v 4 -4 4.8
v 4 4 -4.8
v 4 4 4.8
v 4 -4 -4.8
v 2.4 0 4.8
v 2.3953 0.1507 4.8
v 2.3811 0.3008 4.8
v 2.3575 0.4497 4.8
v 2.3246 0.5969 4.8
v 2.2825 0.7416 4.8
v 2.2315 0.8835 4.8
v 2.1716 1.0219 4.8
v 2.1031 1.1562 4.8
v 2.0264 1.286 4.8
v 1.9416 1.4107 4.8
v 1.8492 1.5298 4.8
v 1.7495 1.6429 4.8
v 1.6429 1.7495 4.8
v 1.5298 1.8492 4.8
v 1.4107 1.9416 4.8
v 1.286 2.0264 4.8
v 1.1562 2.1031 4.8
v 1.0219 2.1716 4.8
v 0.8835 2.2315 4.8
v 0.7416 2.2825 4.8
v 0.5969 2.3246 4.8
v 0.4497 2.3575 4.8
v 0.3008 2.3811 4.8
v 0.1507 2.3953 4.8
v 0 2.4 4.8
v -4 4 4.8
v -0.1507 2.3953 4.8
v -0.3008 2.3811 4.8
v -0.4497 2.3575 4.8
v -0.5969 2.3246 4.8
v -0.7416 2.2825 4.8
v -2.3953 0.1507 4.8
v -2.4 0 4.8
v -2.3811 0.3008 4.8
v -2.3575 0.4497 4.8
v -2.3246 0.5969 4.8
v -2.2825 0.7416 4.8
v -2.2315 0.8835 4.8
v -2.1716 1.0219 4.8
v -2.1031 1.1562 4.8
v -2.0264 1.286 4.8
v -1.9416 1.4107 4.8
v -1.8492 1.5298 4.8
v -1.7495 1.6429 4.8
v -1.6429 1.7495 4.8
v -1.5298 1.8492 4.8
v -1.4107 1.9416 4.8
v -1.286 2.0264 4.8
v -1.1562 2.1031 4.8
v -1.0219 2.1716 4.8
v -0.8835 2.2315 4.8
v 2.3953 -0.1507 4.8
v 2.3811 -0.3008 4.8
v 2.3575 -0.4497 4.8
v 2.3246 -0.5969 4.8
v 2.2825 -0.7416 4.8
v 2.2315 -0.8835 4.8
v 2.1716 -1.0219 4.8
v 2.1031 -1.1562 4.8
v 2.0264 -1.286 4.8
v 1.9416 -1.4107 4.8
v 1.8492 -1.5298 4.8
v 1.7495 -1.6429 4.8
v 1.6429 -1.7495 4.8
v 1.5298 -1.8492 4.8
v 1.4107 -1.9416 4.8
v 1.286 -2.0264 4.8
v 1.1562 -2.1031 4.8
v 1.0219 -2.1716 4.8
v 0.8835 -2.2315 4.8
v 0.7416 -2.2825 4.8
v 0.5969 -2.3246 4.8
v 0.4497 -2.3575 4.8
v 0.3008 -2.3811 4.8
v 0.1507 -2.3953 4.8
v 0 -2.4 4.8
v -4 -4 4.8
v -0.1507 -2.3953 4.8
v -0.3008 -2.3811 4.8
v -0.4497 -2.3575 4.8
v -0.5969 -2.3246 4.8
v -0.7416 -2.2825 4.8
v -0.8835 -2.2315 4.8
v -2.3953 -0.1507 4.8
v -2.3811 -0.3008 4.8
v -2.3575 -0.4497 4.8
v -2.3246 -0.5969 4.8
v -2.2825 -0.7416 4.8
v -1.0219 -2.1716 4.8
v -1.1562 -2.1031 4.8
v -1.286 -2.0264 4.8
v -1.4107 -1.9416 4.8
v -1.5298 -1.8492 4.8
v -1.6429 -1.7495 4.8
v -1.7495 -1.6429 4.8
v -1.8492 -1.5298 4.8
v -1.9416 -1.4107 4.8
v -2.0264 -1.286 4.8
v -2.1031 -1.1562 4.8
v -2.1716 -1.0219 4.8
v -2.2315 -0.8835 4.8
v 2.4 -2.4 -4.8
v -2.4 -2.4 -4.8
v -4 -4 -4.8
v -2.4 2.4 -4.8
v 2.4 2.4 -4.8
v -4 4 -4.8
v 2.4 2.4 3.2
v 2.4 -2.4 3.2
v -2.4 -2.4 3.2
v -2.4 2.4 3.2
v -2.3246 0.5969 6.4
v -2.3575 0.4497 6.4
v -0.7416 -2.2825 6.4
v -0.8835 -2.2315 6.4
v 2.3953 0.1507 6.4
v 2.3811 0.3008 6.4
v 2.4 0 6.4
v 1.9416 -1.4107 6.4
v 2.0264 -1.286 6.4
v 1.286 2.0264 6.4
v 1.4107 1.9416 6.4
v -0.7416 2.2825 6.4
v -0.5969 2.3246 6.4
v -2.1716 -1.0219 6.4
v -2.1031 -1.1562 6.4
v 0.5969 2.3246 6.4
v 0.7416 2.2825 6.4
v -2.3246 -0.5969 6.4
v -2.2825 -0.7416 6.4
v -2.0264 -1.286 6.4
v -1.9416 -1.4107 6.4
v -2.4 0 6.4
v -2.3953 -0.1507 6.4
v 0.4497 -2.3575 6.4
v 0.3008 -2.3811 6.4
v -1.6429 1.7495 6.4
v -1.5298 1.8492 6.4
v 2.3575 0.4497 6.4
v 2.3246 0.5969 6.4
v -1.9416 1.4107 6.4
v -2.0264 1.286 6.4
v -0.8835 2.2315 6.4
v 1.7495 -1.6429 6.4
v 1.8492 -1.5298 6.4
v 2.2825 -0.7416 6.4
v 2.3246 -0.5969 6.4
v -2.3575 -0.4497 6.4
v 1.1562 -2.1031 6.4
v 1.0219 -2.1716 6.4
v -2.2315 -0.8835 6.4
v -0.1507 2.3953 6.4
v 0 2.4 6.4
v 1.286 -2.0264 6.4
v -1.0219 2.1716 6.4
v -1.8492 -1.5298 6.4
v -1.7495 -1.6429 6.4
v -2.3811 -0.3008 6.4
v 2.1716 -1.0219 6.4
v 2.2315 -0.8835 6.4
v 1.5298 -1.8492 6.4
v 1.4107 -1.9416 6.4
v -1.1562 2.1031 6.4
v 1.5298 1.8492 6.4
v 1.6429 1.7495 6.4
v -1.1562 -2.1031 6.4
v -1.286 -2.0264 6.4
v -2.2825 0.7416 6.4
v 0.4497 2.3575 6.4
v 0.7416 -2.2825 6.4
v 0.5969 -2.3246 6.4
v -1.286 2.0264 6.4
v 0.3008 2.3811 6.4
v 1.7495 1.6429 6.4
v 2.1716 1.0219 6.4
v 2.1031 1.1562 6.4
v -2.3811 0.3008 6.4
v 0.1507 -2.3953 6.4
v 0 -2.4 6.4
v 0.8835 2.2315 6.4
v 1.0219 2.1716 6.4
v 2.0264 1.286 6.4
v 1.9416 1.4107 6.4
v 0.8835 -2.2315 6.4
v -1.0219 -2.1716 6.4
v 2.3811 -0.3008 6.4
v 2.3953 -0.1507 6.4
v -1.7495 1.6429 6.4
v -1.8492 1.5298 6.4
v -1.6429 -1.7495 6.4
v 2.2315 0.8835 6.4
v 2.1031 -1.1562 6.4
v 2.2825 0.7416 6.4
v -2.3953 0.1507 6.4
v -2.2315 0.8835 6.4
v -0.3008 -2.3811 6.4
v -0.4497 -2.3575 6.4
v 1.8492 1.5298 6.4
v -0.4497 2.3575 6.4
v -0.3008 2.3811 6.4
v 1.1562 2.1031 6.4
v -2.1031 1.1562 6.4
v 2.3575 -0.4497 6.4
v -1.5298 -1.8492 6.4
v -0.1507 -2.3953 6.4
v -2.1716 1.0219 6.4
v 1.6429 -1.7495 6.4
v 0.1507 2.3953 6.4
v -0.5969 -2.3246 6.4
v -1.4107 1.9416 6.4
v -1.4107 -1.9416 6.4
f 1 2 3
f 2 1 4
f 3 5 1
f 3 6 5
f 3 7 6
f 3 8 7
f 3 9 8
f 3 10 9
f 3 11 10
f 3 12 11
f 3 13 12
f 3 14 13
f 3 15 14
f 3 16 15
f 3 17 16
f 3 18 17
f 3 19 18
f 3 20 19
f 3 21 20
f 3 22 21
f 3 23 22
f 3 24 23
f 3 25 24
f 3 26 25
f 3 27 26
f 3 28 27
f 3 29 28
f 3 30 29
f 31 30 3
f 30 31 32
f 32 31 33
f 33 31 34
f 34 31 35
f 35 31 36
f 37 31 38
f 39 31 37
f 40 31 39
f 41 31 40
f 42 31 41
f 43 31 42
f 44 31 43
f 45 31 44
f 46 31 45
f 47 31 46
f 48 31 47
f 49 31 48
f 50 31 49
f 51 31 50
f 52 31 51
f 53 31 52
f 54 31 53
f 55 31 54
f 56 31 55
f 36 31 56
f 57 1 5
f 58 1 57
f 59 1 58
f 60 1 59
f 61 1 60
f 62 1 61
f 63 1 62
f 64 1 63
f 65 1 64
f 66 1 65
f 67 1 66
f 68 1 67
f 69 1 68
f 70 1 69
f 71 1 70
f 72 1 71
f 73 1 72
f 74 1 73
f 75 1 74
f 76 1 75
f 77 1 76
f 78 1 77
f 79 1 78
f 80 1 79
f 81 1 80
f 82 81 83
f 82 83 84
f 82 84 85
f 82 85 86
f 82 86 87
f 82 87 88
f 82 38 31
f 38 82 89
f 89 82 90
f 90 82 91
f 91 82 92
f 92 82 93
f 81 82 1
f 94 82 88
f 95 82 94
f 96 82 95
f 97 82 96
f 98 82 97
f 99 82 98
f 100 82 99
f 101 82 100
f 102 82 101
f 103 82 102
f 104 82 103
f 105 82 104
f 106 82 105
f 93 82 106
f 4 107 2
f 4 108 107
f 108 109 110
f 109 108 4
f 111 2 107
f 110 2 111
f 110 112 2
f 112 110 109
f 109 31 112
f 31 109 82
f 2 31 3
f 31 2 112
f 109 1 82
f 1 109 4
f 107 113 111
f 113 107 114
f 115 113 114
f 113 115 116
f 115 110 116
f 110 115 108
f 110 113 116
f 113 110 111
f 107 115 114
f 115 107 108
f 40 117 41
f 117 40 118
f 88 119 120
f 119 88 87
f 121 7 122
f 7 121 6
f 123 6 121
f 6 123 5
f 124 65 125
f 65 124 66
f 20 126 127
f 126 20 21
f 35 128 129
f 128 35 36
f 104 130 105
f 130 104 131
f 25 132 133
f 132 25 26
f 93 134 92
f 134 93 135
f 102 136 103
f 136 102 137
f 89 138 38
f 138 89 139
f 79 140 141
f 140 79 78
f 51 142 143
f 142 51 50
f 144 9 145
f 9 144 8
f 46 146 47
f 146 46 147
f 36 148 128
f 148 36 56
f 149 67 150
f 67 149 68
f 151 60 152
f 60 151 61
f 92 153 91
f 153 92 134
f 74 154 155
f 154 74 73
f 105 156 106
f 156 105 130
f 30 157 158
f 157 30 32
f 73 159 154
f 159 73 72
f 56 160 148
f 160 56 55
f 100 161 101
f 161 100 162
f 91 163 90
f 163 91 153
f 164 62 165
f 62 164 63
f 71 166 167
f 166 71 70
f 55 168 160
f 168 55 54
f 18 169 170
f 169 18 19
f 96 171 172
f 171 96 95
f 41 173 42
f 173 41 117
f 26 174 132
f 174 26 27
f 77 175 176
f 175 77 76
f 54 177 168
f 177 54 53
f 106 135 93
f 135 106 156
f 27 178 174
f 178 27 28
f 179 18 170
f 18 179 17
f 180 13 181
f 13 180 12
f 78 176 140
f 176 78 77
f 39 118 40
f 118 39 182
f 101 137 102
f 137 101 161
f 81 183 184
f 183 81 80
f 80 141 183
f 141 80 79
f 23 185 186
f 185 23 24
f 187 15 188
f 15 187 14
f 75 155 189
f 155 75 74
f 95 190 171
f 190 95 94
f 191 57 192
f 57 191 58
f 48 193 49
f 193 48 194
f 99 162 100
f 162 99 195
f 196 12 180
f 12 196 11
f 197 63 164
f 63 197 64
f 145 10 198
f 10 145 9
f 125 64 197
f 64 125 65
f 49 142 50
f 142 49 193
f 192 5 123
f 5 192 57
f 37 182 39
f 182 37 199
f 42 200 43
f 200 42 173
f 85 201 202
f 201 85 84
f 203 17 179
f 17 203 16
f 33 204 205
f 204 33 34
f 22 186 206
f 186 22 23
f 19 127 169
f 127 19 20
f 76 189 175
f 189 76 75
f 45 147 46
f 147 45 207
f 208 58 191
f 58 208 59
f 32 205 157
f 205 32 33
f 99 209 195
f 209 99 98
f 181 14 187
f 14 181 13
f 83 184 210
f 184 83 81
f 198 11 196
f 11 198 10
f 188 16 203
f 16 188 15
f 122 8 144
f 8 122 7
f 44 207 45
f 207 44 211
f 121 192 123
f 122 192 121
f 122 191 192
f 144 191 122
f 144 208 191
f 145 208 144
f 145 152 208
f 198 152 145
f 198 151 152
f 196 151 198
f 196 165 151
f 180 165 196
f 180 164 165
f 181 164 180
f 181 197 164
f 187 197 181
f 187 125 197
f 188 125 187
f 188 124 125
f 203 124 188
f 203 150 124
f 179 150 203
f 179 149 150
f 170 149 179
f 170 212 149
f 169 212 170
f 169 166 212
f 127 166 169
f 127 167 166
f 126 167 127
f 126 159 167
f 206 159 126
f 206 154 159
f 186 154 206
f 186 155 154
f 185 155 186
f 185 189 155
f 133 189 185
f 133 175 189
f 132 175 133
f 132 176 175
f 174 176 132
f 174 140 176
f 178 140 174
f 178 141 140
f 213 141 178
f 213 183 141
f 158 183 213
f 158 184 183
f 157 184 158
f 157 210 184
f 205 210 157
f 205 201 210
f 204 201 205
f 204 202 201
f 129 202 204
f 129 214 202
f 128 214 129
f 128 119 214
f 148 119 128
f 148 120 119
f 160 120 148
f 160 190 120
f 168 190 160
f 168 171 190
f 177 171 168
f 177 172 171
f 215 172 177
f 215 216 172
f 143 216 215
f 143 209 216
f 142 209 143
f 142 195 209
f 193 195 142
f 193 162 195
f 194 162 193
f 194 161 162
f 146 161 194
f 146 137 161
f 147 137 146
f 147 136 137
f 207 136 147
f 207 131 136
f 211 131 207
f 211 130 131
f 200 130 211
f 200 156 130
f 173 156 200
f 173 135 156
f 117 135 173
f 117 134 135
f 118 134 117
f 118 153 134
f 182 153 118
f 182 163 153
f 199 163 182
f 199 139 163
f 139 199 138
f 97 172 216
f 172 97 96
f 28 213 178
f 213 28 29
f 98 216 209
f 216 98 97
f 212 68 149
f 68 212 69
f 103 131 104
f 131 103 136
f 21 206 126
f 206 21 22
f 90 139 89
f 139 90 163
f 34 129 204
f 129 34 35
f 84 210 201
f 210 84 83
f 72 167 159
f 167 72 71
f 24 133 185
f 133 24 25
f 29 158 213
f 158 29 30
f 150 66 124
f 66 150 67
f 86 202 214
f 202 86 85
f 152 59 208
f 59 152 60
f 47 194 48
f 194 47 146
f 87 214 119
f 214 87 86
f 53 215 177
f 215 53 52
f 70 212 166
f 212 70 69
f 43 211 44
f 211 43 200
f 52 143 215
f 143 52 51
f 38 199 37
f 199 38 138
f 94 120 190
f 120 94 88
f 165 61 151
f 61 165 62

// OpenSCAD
// Play well, my friends

brick();

module brick ()
// Very first attempt at a 1x1 lego brick
{
  // Dimensions found at http://bricks.stackexchange.com/questions/288/what-are-the-dimensions-of-a-lego-brick

  width = 8.0;
  length = 8.0;
  height = 9.6;
  thickness = 1.6;
  stud_height = 1.6;
  stud_radius = 2.4;

  union() {
    // body
    difference() {
      cube ([length, width, height], center=true);
      translate ([0, 0, -thickness]) {
        # cube ([length - 2*thickness,
                 width - 2*thickness,
                 height], center=true);
      }
    }

    // stud
    translate ([0, 0, height/2]) {
      cylinder (h=stud_height,
                r=stud_radius,
                $fn=100);
    }
  }
}
  
